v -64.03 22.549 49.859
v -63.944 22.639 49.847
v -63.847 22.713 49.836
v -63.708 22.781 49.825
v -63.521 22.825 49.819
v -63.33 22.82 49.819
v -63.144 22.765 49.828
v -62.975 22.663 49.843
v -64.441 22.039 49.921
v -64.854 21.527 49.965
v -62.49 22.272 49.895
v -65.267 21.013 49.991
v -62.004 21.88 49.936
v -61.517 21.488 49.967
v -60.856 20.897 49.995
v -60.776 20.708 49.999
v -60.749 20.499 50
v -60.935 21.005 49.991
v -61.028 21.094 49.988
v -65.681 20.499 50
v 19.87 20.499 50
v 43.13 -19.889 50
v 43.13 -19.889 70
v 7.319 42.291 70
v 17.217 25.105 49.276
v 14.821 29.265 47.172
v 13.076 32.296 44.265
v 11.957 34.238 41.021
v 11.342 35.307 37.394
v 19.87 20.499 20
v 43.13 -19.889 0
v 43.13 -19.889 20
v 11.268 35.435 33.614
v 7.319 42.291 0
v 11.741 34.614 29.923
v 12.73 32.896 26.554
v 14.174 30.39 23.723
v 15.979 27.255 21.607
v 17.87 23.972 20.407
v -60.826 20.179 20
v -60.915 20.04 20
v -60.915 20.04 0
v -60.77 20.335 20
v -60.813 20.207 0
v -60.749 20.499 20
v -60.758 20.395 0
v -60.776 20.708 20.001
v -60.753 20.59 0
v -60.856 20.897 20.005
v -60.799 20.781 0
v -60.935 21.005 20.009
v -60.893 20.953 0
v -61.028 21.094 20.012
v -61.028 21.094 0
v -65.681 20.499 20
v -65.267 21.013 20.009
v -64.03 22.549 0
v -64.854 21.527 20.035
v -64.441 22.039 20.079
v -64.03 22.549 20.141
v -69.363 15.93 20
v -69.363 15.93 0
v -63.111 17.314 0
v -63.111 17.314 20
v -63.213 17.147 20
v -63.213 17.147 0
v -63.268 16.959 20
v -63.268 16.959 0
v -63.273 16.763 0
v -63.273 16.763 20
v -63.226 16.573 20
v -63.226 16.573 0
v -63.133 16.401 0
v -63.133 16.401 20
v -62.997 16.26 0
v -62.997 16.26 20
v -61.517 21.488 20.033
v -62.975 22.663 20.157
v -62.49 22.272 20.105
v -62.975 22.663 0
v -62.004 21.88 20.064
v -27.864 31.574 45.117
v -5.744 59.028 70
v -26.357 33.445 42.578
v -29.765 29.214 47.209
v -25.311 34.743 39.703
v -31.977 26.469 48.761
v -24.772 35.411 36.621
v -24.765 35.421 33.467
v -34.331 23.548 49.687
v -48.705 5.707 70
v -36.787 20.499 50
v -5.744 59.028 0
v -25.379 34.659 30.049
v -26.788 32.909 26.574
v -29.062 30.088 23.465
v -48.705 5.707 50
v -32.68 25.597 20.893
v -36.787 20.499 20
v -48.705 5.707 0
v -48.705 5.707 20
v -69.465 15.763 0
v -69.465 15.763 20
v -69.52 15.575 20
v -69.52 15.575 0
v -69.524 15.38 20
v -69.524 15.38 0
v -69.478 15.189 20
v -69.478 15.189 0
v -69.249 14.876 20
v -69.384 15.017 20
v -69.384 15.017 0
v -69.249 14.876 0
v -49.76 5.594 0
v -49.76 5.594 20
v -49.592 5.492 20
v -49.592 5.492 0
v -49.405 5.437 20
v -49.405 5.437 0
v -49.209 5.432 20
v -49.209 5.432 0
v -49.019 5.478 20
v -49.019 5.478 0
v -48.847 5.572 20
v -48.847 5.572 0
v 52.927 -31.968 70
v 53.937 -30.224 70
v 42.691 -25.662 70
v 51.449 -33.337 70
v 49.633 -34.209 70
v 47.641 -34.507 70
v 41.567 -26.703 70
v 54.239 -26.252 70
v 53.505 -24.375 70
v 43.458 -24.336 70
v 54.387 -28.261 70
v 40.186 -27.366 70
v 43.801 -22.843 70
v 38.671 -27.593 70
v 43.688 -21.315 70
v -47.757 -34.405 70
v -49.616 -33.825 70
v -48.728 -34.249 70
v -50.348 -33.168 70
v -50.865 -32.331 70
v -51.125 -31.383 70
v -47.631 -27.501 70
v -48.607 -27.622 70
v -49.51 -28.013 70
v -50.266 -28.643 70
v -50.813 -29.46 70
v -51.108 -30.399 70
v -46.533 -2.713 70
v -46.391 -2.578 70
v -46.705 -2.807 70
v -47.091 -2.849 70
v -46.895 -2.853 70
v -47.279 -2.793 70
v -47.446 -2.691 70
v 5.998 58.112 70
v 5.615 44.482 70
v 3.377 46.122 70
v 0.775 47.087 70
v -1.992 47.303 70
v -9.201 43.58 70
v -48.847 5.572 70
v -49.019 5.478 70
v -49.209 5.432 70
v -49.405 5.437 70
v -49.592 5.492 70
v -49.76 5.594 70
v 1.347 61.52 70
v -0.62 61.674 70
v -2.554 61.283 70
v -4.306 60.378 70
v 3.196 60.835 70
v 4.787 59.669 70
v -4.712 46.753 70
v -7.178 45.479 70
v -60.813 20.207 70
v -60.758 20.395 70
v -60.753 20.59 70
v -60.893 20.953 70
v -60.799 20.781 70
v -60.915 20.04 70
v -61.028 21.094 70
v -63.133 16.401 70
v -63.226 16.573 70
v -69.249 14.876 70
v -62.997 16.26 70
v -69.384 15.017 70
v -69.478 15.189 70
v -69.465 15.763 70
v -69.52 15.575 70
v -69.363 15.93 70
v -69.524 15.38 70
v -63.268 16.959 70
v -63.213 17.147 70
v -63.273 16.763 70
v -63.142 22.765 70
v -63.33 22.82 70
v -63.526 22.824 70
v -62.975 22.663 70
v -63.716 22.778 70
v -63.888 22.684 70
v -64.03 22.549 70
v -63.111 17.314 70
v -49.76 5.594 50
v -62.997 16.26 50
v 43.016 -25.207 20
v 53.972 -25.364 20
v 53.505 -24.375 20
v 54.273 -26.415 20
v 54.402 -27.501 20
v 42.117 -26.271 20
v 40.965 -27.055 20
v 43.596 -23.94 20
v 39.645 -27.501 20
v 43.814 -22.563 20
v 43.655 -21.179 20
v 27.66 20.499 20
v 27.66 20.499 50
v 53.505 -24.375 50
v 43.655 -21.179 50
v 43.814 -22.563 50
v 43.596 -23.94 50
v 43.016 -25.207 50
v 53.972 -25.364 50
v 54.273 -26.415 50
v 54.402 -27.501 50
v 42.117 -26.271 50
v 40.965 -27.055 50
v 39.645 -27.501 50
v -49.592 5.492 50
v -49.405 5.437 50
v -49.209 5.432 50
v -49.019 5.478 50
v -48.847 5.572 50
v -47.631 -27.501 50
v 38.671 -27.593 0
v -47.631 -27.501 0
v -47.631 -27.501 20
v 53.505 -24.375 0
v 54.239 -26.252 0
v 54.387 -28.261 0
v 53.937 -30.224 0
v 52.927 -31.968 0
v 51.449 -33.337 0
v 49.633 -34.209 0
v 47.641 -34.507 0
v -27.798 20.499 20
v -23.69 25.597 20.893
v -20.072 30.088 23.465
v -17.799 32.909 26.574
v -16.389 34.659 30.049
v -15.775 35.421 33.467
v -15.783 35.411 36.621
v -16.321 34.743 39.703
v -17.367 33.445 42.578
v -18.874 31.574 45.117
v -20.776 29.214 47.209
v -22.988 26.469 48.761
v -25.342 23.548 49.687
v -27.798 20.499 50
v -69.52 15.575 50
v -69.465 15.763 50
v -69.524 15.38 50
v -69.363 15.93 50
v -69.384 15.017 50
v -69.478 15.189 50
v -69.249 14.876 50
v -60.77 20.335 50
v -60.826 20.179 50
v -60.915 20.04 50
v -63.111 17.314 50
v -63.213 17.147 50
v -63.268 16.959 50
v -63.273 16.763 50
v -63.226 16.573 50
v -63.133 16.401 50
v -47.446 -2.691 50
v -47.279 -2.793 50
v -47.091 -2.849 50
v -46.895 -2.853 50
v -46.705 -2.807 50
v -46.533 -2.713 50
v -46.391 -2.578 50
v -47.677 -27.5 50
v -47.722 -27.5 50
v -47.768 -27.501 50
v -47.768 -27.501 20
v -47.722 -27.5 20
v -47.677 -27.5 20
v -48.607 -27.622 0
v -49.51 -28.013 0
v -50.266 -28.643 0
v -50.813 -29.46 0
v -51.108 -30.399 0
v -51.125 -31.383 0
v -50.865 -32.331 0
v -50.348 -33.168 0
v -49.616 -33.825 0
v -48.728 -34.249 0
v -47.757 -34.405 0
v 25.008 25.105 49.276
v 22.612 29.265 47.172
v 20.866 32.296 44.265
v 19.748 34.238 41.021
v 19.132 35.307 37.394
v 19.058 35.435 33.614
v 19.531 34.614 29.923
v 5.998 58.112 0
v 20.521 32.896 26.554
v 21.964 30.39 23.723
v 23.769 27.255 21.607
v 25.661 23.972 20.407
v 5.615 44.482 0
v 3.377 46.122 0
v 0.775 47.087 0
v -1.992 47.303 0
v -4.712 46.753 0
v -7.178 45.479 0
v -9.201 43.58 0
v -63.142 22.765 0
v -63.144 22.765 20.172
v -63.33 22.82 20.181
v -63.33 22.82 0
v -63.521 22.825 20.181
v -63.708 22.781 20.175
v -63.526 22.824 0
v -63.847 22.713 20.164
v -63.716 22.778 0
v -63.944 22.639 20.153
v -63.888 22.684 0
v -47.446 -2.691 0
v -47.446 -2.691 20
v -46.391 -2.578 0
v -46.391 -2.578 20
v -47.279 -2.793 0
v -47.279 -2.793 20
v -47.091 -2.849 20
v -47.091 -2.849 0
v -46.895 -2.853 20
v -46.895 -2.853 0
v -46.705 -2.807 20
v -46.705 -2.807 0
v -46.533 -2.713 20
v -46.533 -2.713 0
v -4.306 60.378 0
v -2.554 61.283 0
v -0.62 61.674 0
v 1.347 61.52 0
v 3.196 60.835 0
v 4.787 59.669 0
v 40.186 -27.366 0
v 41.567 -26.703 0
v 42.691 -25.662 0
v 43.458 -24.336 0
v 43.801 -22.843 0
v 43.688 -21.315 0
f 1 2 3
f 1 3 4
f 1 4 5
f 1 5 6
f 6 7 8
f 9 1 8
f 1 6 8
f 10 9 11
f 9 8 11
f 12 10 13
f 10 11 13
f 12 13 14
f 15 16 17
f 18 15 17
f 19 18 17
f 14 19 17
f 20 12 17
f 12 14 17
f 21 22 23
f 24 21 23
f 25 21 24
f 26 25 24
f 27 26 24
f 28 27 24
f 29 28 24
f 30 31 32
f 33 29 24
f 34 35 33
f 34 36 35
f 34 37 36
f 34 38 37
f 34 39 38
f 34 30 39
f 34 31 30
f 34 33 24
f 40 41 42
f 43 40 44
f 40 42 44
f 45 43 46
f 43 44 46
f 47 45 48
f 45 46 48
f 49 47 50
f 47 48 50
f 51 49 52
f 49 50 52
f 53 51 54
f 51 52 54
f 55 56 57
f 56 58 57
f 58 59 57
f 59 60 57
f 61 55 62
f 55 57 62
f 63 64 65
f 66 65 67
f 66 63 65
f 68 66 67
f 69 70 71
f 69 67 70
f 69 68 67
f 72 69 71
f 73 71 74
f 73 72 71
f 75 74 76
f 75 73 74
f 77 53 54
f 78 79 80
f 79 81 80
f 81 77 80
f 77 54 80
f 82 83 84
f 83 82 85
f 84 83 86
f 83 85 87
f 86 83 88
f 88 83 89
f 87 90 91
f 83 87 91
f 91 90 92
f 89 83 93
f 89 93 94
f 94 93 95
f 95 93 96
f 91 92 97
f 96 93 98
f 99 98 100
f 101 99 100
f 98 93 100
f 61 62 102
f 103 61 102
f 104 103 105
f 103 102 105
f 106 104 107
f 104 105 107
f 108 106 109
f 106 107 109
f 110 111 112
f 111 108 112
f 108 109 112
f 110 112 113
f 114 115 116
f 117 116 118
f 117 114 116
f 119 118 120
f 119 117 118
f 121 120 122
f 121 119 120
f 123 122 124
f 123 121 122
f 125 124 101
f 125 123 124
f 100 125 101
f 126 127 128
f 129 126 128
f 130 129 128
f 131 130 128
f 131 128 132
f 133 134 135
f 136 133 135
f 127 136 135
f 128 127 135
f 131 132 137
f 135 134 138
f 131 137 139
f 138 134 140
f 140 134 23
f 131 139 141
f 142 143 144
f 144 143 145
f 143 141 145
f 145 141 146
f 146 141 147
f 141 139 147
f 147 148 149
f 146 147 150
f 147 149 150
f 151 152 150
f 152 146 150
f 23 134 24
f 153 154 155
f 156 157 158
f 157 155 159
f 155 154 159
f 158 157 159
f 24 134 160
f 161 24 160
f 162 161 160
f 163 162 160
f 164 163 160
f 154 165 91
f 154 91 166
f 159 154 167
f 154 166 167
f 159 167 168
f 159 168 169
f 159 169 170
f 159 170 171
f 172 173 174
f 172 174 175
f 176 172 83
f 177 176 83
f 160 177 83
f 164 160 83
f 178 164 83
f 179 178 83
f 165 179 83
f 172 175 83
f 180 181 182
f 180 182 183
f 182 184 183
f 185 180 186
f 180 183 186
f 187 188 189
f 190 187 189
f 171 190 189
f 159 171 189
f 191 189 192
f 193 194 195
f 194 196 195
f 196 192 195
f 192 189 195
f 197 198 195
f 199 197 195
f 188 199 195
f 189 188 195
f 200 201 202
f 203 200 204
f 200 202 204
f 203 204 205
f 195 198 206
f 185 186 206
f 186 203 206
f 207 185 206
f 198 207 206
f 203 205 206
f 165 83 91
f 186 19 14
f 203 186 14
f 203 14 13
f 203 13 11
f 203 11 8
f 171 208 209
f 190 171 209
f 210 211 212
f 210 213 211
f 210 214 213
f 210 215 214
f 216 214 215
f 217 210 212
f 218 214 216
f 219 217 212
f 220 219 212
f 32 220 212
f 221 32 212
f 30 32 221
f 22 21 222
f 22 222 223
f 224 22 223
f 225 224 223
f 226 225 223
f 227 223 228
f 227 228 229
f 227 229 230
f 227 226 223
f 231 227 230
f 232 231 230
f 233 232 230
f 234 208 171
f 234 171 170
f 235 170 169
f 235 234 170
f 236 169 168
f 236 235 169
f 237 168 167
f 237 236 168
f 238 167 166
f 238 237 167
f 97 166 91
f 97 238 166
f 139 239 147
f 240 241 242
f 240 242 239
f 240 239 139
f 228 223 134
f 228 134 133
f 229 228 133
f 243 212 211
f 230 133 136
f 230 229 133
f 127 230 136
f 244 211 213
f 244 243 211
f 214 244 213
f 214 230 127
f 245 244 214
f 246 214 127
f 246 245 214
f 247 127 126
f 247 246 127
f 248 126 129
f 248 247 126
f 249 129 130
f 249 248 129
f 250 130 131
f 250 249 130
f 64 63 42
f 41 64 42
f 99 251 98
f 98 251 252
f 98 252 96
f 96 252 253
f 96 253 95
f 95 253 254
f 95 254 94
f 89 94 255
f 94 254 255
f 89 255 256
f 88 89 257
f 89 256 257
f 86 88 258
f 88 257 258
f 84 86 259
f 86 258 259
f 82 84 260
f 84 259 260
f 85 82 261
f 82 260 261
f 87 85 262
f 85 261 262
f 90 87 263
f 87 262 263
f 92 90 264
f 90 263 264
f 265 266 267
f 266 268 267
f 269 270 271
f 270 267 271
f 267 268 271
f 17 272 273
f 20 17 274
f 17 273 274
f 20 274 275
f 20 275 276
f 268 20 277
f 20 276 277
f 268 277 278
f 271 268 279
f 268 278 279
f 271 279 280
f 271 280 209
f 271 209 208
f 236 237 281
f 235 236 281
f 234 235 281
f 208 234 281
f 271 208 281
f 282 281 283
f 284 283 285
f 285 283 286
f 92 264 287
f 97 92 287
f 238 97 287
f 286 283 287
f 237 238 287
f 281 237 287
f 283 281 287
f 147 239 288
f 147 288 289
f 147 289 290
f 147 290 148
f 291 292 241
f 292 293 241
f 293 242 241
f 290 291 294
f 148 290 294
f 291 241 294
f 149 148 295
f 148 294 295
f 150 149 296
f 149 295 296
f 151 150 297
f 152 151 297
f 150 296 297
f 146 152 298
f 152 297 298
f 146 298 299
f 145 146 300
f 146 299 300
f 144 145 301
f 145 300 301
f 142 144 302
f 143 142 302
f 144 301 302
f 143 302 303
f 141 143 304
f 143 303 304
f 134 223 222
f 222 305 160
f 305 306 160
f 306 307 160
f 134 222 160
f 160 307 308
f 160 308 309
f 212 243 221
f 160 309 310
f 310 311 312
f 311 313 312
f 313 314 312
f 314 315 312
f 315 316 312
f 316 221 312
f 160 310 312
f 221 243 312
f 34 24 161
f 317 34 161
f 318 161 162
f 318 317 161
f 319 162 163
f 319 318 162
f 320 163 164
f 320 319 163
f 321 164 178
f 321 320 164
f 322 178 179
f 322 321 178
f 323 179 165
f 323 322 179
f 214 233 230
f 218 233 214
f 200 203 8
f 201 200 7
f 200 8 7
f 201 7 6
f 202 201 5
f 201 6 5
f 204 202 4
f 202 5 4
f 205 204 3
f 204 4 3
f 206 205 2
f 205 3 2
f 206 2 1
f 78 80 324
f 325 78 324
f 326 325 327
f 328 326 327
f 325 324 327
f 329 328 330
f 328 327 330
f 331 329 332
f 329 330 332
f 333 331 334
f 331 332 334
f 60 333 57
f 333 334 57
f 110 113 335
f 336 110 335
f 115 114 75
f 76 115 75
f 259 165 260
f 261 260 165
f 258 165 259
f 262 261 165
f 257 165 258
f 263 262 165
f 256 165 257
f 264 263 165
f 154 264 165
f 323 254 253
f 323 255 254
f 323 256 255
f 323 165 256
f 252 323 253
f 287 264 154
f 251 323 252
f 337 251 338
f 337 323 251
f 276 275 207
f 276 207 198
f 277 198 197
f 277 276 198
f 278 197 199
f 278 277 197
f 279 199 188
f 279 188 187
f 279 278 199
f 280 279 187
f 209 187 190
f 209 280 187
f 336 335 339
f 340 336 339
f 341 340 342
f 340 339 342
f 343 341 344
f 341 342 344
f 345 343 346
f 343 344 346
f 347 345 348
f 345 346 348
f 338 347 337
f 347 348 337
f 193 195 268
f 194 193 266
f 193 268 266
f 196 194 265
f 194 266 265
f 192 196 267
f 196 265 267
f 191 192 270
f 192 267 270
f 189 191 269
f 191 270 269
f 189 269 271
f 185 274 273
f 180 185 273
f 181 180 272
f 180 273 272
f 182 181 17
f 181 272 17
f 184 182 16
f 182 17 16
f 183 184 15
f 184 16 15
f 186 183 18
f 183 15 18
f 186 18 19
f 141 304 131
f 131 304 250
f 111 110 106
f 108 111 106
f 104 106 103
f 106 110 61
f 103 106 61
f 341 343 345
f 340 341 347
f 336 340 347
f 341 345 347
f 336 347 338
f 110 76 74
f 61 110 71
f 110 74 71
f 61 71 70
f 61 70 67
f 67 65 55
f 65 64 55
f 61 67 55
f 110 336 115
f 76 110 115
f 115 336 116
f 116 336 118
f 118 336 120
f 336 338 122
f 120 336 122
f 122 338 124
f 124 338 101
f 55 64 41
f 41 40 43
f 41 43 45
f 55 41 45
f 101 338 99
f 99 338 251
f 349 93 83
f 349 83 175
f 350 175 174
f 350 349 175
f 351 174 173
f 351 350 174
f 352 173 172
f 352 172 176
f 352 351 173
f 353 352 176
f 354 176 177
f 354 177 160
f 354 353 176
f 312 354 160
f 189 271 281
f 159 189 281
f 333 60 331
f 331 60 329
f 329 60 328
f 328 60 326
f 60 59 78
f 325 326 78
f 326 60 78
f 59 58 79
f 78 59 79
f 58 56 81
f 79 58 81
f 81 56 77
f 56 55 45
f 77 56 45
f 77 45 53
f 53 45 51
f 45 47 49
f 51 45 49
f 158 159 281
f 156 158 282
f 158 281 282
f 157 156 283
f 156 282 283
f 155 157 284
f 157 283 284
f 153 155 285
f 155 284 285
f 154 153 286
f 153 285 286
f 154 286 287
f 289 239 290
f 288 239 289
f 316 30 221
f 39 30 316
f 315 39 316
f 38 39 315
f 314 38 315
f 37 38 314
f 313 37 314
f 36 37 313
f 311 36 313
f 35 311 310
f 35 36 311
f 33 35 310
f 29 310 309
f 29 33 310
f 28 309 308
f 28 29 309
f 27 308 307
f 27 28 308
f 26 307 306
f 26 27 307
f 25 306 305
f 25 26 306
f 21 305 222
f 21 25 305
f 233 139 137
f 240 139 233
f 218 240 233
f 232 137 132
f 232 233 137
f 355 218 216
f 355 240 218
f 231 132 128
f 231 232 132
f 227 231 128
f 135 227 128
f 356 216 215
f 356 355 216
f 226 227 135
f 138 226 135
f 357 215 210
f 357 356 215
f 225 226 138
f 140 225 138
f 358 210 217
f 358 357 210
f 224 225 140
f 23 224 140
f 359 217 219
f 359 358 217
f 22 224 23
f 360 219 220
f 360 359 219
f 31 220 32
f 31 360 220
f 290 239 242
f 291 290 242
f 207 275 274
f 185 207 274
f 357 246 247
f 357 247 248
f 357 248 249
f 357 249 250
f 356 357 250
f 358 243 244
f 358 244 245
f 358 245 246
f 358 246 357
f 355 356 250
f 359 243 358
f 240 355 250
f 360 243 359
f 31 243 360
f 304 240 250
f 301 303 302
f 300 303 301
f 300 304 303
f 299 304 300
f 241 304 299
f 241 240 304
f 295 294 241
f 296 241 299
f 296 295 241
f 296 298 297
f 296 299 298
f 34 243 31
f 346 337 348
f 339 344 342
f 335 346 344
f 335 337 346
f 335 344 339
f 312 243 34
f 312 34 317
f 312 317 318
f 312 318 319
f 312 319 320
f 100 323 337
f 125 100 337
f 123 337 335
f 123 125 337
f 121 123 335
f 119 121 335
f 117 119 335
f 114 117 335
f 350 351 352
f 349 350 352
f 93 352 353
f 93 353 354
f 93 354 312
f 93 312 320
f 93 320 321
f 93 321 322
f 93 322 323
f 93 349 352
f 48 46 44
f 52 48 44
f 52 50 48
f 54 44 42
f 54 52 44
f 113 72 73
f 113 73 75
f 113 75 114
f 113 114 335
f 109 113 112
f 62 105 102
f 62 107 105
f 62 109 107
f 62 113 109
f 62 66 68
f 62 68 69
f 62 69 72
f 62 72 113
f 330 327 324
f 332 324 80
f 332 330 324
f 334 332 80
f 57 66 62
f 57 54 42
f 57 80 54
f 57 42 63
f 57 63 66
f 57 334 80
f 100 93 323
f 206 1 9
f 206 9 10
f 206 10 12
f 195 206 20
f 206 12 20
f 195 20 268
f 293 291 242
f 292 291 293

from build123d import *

# Parameters (mm, degrees)
PAD_DEPTH         = 70
POCKET_DEPTH      = 75
POCKET_DEPTH_BACK = 65


with BuildPart() as part:
    # Sketch → Pad (new body)
    with BuildSketch(Plane.XY):
        with BuildLine():
            Line((-9.201384, 43.579781), (-46.391168, -2.578))
            ThreePointArc((-47.445741, -2.691469), (-46.894954, -2.853144), (-46.391168, -2.578))
            Line((-69.249206, 14.875799), (-47.445741, -2.691469))
            ThreePointArc((-69.362676, 15.930373), (-69.52435, 15.379586), (-69.249206, 14.875799))
            Line((-64.029755, 22.549282), (-69.362676, 15.930373))
            ThreePointArc((-62.975181, 22.662751), (-63.525968, 22.824426), (-64.029755, 22.549282))
            Line((-61.028444, 21.094245), (-62.975181, 22.662751))
            ThreePointArc((-60.914974, 20.039672), (-60.7533, 20.590459), (-61.028444, 21.094245))
            Line((-63.110883, 17.314239), (-60.914974, 20.039672))
            ThreePointArc((-63.110883, 17.314239), (-63.272557, 16.763452), (-62.997413, 16.259665))
            Line((-49.759595, 5.593824), (-62.997413, 16.259665))
            ThreePointArc((-49.759595, 5.593824), (-49.208808, 5.432149), (-48.705022, 5.707293))
            Line((-5.744258, 59.027676), (-48.705022, 5.707293))
            ThreePointArc((-5.744258, 59.027676), (0.368567, 61.665407), (5.998454, 58.111729))
            Line((53.504513, -24.375497), (5.998454, 58.111729))
            ThreePointArc((53.504513, -24.375497), (53.49727, -31.134135), (47.640508, -34.507202))
            Line((-47.756765, -34.405463), (47.640508, -34.507202))
            ThreePointArc((-47.631027, -27.500642), (-51.151742, -30.890084), (-47.756765, -34.405463))
            Line((-47.631027, -27.500642), (38.670947, -27.592682))
            ThreePointArc((38.670947, -27.592682), (43.12437, -25.027835), (43.129877, -19.888635))
            Line((43.129877, -19.888635), (7.319285, 42.291148))
            ThreePointArc((7.319285, 42.291148), (-0.60133, 47.290771), (-9.201384, 43.579781))
        make_face()
    extrude(amount=PAD_DEPTH)

    # Sketch001 → Pocket (cut, two sides)
    with BuildSketch(Plane.YZ) as pocket_sk:
        with BuildLine():
            Line((-27.500642, 50), (-27.500642, 20))
            Line((-27.500642, 20), (20.499358, 20))
            ThreePointArc((20.499358, 20), (35.499358, 35), (20.499358, 50))
            Line((20.499358, 50), (-27.500642, 50))
        make_face()
    extrude(amount=-POCKET_DEPTH, mode=Mode.SUBTRACT)
    extrude(pocket_sk.sketch, amount=POCKET_DEPTH_BACK, mode=Mode.SUBTRACT)


solid = part.part
